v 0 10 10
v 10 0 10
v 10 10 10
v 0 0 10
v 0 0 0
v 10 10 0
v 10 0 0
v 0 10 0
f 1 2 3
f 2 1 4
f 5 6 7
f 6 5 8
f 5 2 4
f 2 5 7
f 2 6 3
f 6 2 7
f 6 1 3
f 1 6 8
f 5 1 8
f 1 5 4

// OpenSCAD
// Generated test SCAD for job_1787745767649_3c09e020
module test_part() {
  cube([10, 10, 10]);
}
test_part();
